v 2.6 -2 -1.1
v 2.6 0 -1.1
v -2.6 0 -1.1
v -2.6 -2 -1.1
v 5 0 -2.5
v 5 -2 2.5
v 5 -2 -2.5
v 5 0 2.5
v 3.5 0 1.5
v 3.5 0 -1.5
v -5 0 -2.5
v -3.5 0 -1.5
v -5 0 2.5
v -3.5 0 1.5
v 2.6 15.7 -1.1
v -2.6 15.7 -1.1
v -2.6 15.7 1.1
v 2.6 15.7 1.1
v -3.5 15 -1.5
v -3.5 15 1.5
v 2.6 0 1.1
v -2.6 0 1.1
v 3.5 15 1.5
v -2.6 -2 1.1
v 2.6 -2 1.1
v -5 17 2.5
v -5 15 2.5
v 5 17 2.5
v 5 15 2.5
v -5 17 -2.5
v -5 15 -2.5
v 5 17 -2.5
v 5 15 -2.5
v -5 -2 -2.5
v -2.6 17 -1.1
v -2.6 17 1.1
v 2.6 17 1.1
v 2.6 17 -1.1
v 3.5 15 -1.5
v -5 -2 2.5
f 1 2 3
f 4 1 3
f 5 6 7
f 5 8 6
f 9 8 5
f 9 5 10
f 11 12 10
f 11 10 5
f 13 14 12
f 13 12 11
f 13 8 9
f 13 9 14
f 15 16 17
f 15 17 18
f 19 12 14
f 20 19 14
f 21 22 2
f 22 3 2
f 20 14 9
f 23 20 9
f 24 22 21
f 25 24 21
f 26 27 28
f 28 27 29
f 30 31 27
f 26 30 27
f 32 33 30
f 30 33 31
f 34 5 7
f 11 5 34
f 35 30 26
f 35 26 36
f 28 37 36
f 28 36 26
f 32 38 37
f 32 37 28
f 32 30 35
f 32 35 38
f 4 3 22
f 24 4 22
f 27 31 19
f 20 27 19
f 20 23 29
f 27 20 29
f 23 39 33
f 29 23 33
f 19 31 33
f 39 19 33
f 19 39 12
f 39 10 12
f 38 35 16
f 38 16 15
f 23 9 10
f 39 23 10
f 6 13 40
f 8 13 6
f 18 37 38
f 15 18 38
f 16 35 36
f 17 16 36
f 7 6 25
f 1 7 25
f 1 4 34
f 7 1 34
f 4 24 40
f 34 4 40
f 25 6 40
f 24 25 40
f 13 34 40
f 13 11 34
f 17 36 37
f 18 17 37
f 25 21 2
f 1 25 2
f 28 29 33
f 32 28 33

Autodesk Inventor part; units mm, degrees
ref_plane "YZ Plane" through (0, 0, 0) normal (1, 0, 0) x (0, 1, 0)
ref_plane "XZ Plane" through (0, 0, 0) normal (0, 1, 0) x (-1, 0, 0)
ref_plane "XY Plane" through (0, 0, 0) normal (0, 0, 1) x (1, 0, 0)
sketch "草圖7" plane through (0, 0, 0) normal (0, 1, 0) x (-1, 0, 0)
  line L0 (5, 2.5) -> (-5, 2.5)
  line L1 (-5, 2.5) -> (-5, -2.5)
  line L2 (-5, -2.5) -> (5, -2.5)
  line L3 (5, -2.5) -> (5, 2.5)
  line L4 (5, 2.5) -> (-5, -2.5) construction
  line L5 (-5, 2.5) -> (5, -2.5) construction
  line L6 (2.6, 1.1) -> (-2.6, 1.1)
  line L7 (-2.6, 1.1) -> (-2.6, -1.1)
  line L8 (-2.6, -1.1) -> (2.6, -1.1)
  line L9 (2.6, -1.1) -> (2.6, 1.1)
  line L10 (2.6, 1.1) -> (-2.6, -1.1) construction
  line L11 (-2.6, 1.1) -> (2.6, -1.1) construction
  point P0 (0, 0)
  dimension "d18" = 10
  dimension "d19" = 5
  dimension "d20" = 2.2
  dimension "d21" = 5.2
extrude "擠出7" add sketch "草圖7" against normal blind 2
sketch "草圖8" plane through (0, 0, 0) normal (0, 1, 0) x (1, 0, 0)
  line L0 (-3.5, -1.5) -> (3.5, -1.5)
  line L1 (3.5, -1.5) -> (3.5, 1.5)
  line L2 (3.5, 1.5) -> (-3.5, 1.5)
  line L3 (-3.5, 1.5) -> (-3.5, -1.5)
  line L4 (-3.5, -1.5) -> (3.5, 1.5) construction
  line L5 (3.5, -1.5) -> (-3.5, 1.5) construction
  point P0 (0, 0)
  dimension "d24" = 7
  dimension "d25" = 3
extrude "擠出8" add sketch "草圖8" along normal blind 15
sketch "草圖9" plane through (0, 15, 0) normal (0, 1, 0) x (1, 0, 0)
  line L0 (5, -2.5) -> (5, 2.5) projected
  line L1 (-5, -2.5) -> (5, -2.5)
  line L2 (5, -2.5) -> (5, 2.5)
  line L3 (5, 2.5) -> (-5, 2.5)
  line L4 (-5, 2.5) -> (-5, -2.5)
  line L5 (-5, -2.5) -> (5, 2.5) construction
  line L6 (5, -2.5) -> (-5, 2.5) construction
  point P0 (0, 0)
extrude "擠出9" add sketch "草圖9" along normal blind 2
sketch "草圖10" plane through (0, 17, 0) normal (0, 1, 0) x (1, 0, 0)
  line L0 (-2.6, 1.1) -> (2.6, 1.1) projected
  line L1 (-2.6, -1.1) -> (2.6, -1.1)
  line L2 (2.6, -1.1) -> (2.6, 1.1)
  line L3 (2.6, 1.1) -> (-2.6, 1.1)
  line L4 (-2.6, 1.1) -> (-2.6, -1.1)
  line L5 (-2.6, -1.1) -> (2.6, 1.1) construction
  line L6 (2.6, -1.1) -> (-2.6, 1.1) construction
  point P0 (0, 0)
extrude "擠出10" cut sketch "草圖10" against normal blind 1.3
properties part number "差分線圈感應"
